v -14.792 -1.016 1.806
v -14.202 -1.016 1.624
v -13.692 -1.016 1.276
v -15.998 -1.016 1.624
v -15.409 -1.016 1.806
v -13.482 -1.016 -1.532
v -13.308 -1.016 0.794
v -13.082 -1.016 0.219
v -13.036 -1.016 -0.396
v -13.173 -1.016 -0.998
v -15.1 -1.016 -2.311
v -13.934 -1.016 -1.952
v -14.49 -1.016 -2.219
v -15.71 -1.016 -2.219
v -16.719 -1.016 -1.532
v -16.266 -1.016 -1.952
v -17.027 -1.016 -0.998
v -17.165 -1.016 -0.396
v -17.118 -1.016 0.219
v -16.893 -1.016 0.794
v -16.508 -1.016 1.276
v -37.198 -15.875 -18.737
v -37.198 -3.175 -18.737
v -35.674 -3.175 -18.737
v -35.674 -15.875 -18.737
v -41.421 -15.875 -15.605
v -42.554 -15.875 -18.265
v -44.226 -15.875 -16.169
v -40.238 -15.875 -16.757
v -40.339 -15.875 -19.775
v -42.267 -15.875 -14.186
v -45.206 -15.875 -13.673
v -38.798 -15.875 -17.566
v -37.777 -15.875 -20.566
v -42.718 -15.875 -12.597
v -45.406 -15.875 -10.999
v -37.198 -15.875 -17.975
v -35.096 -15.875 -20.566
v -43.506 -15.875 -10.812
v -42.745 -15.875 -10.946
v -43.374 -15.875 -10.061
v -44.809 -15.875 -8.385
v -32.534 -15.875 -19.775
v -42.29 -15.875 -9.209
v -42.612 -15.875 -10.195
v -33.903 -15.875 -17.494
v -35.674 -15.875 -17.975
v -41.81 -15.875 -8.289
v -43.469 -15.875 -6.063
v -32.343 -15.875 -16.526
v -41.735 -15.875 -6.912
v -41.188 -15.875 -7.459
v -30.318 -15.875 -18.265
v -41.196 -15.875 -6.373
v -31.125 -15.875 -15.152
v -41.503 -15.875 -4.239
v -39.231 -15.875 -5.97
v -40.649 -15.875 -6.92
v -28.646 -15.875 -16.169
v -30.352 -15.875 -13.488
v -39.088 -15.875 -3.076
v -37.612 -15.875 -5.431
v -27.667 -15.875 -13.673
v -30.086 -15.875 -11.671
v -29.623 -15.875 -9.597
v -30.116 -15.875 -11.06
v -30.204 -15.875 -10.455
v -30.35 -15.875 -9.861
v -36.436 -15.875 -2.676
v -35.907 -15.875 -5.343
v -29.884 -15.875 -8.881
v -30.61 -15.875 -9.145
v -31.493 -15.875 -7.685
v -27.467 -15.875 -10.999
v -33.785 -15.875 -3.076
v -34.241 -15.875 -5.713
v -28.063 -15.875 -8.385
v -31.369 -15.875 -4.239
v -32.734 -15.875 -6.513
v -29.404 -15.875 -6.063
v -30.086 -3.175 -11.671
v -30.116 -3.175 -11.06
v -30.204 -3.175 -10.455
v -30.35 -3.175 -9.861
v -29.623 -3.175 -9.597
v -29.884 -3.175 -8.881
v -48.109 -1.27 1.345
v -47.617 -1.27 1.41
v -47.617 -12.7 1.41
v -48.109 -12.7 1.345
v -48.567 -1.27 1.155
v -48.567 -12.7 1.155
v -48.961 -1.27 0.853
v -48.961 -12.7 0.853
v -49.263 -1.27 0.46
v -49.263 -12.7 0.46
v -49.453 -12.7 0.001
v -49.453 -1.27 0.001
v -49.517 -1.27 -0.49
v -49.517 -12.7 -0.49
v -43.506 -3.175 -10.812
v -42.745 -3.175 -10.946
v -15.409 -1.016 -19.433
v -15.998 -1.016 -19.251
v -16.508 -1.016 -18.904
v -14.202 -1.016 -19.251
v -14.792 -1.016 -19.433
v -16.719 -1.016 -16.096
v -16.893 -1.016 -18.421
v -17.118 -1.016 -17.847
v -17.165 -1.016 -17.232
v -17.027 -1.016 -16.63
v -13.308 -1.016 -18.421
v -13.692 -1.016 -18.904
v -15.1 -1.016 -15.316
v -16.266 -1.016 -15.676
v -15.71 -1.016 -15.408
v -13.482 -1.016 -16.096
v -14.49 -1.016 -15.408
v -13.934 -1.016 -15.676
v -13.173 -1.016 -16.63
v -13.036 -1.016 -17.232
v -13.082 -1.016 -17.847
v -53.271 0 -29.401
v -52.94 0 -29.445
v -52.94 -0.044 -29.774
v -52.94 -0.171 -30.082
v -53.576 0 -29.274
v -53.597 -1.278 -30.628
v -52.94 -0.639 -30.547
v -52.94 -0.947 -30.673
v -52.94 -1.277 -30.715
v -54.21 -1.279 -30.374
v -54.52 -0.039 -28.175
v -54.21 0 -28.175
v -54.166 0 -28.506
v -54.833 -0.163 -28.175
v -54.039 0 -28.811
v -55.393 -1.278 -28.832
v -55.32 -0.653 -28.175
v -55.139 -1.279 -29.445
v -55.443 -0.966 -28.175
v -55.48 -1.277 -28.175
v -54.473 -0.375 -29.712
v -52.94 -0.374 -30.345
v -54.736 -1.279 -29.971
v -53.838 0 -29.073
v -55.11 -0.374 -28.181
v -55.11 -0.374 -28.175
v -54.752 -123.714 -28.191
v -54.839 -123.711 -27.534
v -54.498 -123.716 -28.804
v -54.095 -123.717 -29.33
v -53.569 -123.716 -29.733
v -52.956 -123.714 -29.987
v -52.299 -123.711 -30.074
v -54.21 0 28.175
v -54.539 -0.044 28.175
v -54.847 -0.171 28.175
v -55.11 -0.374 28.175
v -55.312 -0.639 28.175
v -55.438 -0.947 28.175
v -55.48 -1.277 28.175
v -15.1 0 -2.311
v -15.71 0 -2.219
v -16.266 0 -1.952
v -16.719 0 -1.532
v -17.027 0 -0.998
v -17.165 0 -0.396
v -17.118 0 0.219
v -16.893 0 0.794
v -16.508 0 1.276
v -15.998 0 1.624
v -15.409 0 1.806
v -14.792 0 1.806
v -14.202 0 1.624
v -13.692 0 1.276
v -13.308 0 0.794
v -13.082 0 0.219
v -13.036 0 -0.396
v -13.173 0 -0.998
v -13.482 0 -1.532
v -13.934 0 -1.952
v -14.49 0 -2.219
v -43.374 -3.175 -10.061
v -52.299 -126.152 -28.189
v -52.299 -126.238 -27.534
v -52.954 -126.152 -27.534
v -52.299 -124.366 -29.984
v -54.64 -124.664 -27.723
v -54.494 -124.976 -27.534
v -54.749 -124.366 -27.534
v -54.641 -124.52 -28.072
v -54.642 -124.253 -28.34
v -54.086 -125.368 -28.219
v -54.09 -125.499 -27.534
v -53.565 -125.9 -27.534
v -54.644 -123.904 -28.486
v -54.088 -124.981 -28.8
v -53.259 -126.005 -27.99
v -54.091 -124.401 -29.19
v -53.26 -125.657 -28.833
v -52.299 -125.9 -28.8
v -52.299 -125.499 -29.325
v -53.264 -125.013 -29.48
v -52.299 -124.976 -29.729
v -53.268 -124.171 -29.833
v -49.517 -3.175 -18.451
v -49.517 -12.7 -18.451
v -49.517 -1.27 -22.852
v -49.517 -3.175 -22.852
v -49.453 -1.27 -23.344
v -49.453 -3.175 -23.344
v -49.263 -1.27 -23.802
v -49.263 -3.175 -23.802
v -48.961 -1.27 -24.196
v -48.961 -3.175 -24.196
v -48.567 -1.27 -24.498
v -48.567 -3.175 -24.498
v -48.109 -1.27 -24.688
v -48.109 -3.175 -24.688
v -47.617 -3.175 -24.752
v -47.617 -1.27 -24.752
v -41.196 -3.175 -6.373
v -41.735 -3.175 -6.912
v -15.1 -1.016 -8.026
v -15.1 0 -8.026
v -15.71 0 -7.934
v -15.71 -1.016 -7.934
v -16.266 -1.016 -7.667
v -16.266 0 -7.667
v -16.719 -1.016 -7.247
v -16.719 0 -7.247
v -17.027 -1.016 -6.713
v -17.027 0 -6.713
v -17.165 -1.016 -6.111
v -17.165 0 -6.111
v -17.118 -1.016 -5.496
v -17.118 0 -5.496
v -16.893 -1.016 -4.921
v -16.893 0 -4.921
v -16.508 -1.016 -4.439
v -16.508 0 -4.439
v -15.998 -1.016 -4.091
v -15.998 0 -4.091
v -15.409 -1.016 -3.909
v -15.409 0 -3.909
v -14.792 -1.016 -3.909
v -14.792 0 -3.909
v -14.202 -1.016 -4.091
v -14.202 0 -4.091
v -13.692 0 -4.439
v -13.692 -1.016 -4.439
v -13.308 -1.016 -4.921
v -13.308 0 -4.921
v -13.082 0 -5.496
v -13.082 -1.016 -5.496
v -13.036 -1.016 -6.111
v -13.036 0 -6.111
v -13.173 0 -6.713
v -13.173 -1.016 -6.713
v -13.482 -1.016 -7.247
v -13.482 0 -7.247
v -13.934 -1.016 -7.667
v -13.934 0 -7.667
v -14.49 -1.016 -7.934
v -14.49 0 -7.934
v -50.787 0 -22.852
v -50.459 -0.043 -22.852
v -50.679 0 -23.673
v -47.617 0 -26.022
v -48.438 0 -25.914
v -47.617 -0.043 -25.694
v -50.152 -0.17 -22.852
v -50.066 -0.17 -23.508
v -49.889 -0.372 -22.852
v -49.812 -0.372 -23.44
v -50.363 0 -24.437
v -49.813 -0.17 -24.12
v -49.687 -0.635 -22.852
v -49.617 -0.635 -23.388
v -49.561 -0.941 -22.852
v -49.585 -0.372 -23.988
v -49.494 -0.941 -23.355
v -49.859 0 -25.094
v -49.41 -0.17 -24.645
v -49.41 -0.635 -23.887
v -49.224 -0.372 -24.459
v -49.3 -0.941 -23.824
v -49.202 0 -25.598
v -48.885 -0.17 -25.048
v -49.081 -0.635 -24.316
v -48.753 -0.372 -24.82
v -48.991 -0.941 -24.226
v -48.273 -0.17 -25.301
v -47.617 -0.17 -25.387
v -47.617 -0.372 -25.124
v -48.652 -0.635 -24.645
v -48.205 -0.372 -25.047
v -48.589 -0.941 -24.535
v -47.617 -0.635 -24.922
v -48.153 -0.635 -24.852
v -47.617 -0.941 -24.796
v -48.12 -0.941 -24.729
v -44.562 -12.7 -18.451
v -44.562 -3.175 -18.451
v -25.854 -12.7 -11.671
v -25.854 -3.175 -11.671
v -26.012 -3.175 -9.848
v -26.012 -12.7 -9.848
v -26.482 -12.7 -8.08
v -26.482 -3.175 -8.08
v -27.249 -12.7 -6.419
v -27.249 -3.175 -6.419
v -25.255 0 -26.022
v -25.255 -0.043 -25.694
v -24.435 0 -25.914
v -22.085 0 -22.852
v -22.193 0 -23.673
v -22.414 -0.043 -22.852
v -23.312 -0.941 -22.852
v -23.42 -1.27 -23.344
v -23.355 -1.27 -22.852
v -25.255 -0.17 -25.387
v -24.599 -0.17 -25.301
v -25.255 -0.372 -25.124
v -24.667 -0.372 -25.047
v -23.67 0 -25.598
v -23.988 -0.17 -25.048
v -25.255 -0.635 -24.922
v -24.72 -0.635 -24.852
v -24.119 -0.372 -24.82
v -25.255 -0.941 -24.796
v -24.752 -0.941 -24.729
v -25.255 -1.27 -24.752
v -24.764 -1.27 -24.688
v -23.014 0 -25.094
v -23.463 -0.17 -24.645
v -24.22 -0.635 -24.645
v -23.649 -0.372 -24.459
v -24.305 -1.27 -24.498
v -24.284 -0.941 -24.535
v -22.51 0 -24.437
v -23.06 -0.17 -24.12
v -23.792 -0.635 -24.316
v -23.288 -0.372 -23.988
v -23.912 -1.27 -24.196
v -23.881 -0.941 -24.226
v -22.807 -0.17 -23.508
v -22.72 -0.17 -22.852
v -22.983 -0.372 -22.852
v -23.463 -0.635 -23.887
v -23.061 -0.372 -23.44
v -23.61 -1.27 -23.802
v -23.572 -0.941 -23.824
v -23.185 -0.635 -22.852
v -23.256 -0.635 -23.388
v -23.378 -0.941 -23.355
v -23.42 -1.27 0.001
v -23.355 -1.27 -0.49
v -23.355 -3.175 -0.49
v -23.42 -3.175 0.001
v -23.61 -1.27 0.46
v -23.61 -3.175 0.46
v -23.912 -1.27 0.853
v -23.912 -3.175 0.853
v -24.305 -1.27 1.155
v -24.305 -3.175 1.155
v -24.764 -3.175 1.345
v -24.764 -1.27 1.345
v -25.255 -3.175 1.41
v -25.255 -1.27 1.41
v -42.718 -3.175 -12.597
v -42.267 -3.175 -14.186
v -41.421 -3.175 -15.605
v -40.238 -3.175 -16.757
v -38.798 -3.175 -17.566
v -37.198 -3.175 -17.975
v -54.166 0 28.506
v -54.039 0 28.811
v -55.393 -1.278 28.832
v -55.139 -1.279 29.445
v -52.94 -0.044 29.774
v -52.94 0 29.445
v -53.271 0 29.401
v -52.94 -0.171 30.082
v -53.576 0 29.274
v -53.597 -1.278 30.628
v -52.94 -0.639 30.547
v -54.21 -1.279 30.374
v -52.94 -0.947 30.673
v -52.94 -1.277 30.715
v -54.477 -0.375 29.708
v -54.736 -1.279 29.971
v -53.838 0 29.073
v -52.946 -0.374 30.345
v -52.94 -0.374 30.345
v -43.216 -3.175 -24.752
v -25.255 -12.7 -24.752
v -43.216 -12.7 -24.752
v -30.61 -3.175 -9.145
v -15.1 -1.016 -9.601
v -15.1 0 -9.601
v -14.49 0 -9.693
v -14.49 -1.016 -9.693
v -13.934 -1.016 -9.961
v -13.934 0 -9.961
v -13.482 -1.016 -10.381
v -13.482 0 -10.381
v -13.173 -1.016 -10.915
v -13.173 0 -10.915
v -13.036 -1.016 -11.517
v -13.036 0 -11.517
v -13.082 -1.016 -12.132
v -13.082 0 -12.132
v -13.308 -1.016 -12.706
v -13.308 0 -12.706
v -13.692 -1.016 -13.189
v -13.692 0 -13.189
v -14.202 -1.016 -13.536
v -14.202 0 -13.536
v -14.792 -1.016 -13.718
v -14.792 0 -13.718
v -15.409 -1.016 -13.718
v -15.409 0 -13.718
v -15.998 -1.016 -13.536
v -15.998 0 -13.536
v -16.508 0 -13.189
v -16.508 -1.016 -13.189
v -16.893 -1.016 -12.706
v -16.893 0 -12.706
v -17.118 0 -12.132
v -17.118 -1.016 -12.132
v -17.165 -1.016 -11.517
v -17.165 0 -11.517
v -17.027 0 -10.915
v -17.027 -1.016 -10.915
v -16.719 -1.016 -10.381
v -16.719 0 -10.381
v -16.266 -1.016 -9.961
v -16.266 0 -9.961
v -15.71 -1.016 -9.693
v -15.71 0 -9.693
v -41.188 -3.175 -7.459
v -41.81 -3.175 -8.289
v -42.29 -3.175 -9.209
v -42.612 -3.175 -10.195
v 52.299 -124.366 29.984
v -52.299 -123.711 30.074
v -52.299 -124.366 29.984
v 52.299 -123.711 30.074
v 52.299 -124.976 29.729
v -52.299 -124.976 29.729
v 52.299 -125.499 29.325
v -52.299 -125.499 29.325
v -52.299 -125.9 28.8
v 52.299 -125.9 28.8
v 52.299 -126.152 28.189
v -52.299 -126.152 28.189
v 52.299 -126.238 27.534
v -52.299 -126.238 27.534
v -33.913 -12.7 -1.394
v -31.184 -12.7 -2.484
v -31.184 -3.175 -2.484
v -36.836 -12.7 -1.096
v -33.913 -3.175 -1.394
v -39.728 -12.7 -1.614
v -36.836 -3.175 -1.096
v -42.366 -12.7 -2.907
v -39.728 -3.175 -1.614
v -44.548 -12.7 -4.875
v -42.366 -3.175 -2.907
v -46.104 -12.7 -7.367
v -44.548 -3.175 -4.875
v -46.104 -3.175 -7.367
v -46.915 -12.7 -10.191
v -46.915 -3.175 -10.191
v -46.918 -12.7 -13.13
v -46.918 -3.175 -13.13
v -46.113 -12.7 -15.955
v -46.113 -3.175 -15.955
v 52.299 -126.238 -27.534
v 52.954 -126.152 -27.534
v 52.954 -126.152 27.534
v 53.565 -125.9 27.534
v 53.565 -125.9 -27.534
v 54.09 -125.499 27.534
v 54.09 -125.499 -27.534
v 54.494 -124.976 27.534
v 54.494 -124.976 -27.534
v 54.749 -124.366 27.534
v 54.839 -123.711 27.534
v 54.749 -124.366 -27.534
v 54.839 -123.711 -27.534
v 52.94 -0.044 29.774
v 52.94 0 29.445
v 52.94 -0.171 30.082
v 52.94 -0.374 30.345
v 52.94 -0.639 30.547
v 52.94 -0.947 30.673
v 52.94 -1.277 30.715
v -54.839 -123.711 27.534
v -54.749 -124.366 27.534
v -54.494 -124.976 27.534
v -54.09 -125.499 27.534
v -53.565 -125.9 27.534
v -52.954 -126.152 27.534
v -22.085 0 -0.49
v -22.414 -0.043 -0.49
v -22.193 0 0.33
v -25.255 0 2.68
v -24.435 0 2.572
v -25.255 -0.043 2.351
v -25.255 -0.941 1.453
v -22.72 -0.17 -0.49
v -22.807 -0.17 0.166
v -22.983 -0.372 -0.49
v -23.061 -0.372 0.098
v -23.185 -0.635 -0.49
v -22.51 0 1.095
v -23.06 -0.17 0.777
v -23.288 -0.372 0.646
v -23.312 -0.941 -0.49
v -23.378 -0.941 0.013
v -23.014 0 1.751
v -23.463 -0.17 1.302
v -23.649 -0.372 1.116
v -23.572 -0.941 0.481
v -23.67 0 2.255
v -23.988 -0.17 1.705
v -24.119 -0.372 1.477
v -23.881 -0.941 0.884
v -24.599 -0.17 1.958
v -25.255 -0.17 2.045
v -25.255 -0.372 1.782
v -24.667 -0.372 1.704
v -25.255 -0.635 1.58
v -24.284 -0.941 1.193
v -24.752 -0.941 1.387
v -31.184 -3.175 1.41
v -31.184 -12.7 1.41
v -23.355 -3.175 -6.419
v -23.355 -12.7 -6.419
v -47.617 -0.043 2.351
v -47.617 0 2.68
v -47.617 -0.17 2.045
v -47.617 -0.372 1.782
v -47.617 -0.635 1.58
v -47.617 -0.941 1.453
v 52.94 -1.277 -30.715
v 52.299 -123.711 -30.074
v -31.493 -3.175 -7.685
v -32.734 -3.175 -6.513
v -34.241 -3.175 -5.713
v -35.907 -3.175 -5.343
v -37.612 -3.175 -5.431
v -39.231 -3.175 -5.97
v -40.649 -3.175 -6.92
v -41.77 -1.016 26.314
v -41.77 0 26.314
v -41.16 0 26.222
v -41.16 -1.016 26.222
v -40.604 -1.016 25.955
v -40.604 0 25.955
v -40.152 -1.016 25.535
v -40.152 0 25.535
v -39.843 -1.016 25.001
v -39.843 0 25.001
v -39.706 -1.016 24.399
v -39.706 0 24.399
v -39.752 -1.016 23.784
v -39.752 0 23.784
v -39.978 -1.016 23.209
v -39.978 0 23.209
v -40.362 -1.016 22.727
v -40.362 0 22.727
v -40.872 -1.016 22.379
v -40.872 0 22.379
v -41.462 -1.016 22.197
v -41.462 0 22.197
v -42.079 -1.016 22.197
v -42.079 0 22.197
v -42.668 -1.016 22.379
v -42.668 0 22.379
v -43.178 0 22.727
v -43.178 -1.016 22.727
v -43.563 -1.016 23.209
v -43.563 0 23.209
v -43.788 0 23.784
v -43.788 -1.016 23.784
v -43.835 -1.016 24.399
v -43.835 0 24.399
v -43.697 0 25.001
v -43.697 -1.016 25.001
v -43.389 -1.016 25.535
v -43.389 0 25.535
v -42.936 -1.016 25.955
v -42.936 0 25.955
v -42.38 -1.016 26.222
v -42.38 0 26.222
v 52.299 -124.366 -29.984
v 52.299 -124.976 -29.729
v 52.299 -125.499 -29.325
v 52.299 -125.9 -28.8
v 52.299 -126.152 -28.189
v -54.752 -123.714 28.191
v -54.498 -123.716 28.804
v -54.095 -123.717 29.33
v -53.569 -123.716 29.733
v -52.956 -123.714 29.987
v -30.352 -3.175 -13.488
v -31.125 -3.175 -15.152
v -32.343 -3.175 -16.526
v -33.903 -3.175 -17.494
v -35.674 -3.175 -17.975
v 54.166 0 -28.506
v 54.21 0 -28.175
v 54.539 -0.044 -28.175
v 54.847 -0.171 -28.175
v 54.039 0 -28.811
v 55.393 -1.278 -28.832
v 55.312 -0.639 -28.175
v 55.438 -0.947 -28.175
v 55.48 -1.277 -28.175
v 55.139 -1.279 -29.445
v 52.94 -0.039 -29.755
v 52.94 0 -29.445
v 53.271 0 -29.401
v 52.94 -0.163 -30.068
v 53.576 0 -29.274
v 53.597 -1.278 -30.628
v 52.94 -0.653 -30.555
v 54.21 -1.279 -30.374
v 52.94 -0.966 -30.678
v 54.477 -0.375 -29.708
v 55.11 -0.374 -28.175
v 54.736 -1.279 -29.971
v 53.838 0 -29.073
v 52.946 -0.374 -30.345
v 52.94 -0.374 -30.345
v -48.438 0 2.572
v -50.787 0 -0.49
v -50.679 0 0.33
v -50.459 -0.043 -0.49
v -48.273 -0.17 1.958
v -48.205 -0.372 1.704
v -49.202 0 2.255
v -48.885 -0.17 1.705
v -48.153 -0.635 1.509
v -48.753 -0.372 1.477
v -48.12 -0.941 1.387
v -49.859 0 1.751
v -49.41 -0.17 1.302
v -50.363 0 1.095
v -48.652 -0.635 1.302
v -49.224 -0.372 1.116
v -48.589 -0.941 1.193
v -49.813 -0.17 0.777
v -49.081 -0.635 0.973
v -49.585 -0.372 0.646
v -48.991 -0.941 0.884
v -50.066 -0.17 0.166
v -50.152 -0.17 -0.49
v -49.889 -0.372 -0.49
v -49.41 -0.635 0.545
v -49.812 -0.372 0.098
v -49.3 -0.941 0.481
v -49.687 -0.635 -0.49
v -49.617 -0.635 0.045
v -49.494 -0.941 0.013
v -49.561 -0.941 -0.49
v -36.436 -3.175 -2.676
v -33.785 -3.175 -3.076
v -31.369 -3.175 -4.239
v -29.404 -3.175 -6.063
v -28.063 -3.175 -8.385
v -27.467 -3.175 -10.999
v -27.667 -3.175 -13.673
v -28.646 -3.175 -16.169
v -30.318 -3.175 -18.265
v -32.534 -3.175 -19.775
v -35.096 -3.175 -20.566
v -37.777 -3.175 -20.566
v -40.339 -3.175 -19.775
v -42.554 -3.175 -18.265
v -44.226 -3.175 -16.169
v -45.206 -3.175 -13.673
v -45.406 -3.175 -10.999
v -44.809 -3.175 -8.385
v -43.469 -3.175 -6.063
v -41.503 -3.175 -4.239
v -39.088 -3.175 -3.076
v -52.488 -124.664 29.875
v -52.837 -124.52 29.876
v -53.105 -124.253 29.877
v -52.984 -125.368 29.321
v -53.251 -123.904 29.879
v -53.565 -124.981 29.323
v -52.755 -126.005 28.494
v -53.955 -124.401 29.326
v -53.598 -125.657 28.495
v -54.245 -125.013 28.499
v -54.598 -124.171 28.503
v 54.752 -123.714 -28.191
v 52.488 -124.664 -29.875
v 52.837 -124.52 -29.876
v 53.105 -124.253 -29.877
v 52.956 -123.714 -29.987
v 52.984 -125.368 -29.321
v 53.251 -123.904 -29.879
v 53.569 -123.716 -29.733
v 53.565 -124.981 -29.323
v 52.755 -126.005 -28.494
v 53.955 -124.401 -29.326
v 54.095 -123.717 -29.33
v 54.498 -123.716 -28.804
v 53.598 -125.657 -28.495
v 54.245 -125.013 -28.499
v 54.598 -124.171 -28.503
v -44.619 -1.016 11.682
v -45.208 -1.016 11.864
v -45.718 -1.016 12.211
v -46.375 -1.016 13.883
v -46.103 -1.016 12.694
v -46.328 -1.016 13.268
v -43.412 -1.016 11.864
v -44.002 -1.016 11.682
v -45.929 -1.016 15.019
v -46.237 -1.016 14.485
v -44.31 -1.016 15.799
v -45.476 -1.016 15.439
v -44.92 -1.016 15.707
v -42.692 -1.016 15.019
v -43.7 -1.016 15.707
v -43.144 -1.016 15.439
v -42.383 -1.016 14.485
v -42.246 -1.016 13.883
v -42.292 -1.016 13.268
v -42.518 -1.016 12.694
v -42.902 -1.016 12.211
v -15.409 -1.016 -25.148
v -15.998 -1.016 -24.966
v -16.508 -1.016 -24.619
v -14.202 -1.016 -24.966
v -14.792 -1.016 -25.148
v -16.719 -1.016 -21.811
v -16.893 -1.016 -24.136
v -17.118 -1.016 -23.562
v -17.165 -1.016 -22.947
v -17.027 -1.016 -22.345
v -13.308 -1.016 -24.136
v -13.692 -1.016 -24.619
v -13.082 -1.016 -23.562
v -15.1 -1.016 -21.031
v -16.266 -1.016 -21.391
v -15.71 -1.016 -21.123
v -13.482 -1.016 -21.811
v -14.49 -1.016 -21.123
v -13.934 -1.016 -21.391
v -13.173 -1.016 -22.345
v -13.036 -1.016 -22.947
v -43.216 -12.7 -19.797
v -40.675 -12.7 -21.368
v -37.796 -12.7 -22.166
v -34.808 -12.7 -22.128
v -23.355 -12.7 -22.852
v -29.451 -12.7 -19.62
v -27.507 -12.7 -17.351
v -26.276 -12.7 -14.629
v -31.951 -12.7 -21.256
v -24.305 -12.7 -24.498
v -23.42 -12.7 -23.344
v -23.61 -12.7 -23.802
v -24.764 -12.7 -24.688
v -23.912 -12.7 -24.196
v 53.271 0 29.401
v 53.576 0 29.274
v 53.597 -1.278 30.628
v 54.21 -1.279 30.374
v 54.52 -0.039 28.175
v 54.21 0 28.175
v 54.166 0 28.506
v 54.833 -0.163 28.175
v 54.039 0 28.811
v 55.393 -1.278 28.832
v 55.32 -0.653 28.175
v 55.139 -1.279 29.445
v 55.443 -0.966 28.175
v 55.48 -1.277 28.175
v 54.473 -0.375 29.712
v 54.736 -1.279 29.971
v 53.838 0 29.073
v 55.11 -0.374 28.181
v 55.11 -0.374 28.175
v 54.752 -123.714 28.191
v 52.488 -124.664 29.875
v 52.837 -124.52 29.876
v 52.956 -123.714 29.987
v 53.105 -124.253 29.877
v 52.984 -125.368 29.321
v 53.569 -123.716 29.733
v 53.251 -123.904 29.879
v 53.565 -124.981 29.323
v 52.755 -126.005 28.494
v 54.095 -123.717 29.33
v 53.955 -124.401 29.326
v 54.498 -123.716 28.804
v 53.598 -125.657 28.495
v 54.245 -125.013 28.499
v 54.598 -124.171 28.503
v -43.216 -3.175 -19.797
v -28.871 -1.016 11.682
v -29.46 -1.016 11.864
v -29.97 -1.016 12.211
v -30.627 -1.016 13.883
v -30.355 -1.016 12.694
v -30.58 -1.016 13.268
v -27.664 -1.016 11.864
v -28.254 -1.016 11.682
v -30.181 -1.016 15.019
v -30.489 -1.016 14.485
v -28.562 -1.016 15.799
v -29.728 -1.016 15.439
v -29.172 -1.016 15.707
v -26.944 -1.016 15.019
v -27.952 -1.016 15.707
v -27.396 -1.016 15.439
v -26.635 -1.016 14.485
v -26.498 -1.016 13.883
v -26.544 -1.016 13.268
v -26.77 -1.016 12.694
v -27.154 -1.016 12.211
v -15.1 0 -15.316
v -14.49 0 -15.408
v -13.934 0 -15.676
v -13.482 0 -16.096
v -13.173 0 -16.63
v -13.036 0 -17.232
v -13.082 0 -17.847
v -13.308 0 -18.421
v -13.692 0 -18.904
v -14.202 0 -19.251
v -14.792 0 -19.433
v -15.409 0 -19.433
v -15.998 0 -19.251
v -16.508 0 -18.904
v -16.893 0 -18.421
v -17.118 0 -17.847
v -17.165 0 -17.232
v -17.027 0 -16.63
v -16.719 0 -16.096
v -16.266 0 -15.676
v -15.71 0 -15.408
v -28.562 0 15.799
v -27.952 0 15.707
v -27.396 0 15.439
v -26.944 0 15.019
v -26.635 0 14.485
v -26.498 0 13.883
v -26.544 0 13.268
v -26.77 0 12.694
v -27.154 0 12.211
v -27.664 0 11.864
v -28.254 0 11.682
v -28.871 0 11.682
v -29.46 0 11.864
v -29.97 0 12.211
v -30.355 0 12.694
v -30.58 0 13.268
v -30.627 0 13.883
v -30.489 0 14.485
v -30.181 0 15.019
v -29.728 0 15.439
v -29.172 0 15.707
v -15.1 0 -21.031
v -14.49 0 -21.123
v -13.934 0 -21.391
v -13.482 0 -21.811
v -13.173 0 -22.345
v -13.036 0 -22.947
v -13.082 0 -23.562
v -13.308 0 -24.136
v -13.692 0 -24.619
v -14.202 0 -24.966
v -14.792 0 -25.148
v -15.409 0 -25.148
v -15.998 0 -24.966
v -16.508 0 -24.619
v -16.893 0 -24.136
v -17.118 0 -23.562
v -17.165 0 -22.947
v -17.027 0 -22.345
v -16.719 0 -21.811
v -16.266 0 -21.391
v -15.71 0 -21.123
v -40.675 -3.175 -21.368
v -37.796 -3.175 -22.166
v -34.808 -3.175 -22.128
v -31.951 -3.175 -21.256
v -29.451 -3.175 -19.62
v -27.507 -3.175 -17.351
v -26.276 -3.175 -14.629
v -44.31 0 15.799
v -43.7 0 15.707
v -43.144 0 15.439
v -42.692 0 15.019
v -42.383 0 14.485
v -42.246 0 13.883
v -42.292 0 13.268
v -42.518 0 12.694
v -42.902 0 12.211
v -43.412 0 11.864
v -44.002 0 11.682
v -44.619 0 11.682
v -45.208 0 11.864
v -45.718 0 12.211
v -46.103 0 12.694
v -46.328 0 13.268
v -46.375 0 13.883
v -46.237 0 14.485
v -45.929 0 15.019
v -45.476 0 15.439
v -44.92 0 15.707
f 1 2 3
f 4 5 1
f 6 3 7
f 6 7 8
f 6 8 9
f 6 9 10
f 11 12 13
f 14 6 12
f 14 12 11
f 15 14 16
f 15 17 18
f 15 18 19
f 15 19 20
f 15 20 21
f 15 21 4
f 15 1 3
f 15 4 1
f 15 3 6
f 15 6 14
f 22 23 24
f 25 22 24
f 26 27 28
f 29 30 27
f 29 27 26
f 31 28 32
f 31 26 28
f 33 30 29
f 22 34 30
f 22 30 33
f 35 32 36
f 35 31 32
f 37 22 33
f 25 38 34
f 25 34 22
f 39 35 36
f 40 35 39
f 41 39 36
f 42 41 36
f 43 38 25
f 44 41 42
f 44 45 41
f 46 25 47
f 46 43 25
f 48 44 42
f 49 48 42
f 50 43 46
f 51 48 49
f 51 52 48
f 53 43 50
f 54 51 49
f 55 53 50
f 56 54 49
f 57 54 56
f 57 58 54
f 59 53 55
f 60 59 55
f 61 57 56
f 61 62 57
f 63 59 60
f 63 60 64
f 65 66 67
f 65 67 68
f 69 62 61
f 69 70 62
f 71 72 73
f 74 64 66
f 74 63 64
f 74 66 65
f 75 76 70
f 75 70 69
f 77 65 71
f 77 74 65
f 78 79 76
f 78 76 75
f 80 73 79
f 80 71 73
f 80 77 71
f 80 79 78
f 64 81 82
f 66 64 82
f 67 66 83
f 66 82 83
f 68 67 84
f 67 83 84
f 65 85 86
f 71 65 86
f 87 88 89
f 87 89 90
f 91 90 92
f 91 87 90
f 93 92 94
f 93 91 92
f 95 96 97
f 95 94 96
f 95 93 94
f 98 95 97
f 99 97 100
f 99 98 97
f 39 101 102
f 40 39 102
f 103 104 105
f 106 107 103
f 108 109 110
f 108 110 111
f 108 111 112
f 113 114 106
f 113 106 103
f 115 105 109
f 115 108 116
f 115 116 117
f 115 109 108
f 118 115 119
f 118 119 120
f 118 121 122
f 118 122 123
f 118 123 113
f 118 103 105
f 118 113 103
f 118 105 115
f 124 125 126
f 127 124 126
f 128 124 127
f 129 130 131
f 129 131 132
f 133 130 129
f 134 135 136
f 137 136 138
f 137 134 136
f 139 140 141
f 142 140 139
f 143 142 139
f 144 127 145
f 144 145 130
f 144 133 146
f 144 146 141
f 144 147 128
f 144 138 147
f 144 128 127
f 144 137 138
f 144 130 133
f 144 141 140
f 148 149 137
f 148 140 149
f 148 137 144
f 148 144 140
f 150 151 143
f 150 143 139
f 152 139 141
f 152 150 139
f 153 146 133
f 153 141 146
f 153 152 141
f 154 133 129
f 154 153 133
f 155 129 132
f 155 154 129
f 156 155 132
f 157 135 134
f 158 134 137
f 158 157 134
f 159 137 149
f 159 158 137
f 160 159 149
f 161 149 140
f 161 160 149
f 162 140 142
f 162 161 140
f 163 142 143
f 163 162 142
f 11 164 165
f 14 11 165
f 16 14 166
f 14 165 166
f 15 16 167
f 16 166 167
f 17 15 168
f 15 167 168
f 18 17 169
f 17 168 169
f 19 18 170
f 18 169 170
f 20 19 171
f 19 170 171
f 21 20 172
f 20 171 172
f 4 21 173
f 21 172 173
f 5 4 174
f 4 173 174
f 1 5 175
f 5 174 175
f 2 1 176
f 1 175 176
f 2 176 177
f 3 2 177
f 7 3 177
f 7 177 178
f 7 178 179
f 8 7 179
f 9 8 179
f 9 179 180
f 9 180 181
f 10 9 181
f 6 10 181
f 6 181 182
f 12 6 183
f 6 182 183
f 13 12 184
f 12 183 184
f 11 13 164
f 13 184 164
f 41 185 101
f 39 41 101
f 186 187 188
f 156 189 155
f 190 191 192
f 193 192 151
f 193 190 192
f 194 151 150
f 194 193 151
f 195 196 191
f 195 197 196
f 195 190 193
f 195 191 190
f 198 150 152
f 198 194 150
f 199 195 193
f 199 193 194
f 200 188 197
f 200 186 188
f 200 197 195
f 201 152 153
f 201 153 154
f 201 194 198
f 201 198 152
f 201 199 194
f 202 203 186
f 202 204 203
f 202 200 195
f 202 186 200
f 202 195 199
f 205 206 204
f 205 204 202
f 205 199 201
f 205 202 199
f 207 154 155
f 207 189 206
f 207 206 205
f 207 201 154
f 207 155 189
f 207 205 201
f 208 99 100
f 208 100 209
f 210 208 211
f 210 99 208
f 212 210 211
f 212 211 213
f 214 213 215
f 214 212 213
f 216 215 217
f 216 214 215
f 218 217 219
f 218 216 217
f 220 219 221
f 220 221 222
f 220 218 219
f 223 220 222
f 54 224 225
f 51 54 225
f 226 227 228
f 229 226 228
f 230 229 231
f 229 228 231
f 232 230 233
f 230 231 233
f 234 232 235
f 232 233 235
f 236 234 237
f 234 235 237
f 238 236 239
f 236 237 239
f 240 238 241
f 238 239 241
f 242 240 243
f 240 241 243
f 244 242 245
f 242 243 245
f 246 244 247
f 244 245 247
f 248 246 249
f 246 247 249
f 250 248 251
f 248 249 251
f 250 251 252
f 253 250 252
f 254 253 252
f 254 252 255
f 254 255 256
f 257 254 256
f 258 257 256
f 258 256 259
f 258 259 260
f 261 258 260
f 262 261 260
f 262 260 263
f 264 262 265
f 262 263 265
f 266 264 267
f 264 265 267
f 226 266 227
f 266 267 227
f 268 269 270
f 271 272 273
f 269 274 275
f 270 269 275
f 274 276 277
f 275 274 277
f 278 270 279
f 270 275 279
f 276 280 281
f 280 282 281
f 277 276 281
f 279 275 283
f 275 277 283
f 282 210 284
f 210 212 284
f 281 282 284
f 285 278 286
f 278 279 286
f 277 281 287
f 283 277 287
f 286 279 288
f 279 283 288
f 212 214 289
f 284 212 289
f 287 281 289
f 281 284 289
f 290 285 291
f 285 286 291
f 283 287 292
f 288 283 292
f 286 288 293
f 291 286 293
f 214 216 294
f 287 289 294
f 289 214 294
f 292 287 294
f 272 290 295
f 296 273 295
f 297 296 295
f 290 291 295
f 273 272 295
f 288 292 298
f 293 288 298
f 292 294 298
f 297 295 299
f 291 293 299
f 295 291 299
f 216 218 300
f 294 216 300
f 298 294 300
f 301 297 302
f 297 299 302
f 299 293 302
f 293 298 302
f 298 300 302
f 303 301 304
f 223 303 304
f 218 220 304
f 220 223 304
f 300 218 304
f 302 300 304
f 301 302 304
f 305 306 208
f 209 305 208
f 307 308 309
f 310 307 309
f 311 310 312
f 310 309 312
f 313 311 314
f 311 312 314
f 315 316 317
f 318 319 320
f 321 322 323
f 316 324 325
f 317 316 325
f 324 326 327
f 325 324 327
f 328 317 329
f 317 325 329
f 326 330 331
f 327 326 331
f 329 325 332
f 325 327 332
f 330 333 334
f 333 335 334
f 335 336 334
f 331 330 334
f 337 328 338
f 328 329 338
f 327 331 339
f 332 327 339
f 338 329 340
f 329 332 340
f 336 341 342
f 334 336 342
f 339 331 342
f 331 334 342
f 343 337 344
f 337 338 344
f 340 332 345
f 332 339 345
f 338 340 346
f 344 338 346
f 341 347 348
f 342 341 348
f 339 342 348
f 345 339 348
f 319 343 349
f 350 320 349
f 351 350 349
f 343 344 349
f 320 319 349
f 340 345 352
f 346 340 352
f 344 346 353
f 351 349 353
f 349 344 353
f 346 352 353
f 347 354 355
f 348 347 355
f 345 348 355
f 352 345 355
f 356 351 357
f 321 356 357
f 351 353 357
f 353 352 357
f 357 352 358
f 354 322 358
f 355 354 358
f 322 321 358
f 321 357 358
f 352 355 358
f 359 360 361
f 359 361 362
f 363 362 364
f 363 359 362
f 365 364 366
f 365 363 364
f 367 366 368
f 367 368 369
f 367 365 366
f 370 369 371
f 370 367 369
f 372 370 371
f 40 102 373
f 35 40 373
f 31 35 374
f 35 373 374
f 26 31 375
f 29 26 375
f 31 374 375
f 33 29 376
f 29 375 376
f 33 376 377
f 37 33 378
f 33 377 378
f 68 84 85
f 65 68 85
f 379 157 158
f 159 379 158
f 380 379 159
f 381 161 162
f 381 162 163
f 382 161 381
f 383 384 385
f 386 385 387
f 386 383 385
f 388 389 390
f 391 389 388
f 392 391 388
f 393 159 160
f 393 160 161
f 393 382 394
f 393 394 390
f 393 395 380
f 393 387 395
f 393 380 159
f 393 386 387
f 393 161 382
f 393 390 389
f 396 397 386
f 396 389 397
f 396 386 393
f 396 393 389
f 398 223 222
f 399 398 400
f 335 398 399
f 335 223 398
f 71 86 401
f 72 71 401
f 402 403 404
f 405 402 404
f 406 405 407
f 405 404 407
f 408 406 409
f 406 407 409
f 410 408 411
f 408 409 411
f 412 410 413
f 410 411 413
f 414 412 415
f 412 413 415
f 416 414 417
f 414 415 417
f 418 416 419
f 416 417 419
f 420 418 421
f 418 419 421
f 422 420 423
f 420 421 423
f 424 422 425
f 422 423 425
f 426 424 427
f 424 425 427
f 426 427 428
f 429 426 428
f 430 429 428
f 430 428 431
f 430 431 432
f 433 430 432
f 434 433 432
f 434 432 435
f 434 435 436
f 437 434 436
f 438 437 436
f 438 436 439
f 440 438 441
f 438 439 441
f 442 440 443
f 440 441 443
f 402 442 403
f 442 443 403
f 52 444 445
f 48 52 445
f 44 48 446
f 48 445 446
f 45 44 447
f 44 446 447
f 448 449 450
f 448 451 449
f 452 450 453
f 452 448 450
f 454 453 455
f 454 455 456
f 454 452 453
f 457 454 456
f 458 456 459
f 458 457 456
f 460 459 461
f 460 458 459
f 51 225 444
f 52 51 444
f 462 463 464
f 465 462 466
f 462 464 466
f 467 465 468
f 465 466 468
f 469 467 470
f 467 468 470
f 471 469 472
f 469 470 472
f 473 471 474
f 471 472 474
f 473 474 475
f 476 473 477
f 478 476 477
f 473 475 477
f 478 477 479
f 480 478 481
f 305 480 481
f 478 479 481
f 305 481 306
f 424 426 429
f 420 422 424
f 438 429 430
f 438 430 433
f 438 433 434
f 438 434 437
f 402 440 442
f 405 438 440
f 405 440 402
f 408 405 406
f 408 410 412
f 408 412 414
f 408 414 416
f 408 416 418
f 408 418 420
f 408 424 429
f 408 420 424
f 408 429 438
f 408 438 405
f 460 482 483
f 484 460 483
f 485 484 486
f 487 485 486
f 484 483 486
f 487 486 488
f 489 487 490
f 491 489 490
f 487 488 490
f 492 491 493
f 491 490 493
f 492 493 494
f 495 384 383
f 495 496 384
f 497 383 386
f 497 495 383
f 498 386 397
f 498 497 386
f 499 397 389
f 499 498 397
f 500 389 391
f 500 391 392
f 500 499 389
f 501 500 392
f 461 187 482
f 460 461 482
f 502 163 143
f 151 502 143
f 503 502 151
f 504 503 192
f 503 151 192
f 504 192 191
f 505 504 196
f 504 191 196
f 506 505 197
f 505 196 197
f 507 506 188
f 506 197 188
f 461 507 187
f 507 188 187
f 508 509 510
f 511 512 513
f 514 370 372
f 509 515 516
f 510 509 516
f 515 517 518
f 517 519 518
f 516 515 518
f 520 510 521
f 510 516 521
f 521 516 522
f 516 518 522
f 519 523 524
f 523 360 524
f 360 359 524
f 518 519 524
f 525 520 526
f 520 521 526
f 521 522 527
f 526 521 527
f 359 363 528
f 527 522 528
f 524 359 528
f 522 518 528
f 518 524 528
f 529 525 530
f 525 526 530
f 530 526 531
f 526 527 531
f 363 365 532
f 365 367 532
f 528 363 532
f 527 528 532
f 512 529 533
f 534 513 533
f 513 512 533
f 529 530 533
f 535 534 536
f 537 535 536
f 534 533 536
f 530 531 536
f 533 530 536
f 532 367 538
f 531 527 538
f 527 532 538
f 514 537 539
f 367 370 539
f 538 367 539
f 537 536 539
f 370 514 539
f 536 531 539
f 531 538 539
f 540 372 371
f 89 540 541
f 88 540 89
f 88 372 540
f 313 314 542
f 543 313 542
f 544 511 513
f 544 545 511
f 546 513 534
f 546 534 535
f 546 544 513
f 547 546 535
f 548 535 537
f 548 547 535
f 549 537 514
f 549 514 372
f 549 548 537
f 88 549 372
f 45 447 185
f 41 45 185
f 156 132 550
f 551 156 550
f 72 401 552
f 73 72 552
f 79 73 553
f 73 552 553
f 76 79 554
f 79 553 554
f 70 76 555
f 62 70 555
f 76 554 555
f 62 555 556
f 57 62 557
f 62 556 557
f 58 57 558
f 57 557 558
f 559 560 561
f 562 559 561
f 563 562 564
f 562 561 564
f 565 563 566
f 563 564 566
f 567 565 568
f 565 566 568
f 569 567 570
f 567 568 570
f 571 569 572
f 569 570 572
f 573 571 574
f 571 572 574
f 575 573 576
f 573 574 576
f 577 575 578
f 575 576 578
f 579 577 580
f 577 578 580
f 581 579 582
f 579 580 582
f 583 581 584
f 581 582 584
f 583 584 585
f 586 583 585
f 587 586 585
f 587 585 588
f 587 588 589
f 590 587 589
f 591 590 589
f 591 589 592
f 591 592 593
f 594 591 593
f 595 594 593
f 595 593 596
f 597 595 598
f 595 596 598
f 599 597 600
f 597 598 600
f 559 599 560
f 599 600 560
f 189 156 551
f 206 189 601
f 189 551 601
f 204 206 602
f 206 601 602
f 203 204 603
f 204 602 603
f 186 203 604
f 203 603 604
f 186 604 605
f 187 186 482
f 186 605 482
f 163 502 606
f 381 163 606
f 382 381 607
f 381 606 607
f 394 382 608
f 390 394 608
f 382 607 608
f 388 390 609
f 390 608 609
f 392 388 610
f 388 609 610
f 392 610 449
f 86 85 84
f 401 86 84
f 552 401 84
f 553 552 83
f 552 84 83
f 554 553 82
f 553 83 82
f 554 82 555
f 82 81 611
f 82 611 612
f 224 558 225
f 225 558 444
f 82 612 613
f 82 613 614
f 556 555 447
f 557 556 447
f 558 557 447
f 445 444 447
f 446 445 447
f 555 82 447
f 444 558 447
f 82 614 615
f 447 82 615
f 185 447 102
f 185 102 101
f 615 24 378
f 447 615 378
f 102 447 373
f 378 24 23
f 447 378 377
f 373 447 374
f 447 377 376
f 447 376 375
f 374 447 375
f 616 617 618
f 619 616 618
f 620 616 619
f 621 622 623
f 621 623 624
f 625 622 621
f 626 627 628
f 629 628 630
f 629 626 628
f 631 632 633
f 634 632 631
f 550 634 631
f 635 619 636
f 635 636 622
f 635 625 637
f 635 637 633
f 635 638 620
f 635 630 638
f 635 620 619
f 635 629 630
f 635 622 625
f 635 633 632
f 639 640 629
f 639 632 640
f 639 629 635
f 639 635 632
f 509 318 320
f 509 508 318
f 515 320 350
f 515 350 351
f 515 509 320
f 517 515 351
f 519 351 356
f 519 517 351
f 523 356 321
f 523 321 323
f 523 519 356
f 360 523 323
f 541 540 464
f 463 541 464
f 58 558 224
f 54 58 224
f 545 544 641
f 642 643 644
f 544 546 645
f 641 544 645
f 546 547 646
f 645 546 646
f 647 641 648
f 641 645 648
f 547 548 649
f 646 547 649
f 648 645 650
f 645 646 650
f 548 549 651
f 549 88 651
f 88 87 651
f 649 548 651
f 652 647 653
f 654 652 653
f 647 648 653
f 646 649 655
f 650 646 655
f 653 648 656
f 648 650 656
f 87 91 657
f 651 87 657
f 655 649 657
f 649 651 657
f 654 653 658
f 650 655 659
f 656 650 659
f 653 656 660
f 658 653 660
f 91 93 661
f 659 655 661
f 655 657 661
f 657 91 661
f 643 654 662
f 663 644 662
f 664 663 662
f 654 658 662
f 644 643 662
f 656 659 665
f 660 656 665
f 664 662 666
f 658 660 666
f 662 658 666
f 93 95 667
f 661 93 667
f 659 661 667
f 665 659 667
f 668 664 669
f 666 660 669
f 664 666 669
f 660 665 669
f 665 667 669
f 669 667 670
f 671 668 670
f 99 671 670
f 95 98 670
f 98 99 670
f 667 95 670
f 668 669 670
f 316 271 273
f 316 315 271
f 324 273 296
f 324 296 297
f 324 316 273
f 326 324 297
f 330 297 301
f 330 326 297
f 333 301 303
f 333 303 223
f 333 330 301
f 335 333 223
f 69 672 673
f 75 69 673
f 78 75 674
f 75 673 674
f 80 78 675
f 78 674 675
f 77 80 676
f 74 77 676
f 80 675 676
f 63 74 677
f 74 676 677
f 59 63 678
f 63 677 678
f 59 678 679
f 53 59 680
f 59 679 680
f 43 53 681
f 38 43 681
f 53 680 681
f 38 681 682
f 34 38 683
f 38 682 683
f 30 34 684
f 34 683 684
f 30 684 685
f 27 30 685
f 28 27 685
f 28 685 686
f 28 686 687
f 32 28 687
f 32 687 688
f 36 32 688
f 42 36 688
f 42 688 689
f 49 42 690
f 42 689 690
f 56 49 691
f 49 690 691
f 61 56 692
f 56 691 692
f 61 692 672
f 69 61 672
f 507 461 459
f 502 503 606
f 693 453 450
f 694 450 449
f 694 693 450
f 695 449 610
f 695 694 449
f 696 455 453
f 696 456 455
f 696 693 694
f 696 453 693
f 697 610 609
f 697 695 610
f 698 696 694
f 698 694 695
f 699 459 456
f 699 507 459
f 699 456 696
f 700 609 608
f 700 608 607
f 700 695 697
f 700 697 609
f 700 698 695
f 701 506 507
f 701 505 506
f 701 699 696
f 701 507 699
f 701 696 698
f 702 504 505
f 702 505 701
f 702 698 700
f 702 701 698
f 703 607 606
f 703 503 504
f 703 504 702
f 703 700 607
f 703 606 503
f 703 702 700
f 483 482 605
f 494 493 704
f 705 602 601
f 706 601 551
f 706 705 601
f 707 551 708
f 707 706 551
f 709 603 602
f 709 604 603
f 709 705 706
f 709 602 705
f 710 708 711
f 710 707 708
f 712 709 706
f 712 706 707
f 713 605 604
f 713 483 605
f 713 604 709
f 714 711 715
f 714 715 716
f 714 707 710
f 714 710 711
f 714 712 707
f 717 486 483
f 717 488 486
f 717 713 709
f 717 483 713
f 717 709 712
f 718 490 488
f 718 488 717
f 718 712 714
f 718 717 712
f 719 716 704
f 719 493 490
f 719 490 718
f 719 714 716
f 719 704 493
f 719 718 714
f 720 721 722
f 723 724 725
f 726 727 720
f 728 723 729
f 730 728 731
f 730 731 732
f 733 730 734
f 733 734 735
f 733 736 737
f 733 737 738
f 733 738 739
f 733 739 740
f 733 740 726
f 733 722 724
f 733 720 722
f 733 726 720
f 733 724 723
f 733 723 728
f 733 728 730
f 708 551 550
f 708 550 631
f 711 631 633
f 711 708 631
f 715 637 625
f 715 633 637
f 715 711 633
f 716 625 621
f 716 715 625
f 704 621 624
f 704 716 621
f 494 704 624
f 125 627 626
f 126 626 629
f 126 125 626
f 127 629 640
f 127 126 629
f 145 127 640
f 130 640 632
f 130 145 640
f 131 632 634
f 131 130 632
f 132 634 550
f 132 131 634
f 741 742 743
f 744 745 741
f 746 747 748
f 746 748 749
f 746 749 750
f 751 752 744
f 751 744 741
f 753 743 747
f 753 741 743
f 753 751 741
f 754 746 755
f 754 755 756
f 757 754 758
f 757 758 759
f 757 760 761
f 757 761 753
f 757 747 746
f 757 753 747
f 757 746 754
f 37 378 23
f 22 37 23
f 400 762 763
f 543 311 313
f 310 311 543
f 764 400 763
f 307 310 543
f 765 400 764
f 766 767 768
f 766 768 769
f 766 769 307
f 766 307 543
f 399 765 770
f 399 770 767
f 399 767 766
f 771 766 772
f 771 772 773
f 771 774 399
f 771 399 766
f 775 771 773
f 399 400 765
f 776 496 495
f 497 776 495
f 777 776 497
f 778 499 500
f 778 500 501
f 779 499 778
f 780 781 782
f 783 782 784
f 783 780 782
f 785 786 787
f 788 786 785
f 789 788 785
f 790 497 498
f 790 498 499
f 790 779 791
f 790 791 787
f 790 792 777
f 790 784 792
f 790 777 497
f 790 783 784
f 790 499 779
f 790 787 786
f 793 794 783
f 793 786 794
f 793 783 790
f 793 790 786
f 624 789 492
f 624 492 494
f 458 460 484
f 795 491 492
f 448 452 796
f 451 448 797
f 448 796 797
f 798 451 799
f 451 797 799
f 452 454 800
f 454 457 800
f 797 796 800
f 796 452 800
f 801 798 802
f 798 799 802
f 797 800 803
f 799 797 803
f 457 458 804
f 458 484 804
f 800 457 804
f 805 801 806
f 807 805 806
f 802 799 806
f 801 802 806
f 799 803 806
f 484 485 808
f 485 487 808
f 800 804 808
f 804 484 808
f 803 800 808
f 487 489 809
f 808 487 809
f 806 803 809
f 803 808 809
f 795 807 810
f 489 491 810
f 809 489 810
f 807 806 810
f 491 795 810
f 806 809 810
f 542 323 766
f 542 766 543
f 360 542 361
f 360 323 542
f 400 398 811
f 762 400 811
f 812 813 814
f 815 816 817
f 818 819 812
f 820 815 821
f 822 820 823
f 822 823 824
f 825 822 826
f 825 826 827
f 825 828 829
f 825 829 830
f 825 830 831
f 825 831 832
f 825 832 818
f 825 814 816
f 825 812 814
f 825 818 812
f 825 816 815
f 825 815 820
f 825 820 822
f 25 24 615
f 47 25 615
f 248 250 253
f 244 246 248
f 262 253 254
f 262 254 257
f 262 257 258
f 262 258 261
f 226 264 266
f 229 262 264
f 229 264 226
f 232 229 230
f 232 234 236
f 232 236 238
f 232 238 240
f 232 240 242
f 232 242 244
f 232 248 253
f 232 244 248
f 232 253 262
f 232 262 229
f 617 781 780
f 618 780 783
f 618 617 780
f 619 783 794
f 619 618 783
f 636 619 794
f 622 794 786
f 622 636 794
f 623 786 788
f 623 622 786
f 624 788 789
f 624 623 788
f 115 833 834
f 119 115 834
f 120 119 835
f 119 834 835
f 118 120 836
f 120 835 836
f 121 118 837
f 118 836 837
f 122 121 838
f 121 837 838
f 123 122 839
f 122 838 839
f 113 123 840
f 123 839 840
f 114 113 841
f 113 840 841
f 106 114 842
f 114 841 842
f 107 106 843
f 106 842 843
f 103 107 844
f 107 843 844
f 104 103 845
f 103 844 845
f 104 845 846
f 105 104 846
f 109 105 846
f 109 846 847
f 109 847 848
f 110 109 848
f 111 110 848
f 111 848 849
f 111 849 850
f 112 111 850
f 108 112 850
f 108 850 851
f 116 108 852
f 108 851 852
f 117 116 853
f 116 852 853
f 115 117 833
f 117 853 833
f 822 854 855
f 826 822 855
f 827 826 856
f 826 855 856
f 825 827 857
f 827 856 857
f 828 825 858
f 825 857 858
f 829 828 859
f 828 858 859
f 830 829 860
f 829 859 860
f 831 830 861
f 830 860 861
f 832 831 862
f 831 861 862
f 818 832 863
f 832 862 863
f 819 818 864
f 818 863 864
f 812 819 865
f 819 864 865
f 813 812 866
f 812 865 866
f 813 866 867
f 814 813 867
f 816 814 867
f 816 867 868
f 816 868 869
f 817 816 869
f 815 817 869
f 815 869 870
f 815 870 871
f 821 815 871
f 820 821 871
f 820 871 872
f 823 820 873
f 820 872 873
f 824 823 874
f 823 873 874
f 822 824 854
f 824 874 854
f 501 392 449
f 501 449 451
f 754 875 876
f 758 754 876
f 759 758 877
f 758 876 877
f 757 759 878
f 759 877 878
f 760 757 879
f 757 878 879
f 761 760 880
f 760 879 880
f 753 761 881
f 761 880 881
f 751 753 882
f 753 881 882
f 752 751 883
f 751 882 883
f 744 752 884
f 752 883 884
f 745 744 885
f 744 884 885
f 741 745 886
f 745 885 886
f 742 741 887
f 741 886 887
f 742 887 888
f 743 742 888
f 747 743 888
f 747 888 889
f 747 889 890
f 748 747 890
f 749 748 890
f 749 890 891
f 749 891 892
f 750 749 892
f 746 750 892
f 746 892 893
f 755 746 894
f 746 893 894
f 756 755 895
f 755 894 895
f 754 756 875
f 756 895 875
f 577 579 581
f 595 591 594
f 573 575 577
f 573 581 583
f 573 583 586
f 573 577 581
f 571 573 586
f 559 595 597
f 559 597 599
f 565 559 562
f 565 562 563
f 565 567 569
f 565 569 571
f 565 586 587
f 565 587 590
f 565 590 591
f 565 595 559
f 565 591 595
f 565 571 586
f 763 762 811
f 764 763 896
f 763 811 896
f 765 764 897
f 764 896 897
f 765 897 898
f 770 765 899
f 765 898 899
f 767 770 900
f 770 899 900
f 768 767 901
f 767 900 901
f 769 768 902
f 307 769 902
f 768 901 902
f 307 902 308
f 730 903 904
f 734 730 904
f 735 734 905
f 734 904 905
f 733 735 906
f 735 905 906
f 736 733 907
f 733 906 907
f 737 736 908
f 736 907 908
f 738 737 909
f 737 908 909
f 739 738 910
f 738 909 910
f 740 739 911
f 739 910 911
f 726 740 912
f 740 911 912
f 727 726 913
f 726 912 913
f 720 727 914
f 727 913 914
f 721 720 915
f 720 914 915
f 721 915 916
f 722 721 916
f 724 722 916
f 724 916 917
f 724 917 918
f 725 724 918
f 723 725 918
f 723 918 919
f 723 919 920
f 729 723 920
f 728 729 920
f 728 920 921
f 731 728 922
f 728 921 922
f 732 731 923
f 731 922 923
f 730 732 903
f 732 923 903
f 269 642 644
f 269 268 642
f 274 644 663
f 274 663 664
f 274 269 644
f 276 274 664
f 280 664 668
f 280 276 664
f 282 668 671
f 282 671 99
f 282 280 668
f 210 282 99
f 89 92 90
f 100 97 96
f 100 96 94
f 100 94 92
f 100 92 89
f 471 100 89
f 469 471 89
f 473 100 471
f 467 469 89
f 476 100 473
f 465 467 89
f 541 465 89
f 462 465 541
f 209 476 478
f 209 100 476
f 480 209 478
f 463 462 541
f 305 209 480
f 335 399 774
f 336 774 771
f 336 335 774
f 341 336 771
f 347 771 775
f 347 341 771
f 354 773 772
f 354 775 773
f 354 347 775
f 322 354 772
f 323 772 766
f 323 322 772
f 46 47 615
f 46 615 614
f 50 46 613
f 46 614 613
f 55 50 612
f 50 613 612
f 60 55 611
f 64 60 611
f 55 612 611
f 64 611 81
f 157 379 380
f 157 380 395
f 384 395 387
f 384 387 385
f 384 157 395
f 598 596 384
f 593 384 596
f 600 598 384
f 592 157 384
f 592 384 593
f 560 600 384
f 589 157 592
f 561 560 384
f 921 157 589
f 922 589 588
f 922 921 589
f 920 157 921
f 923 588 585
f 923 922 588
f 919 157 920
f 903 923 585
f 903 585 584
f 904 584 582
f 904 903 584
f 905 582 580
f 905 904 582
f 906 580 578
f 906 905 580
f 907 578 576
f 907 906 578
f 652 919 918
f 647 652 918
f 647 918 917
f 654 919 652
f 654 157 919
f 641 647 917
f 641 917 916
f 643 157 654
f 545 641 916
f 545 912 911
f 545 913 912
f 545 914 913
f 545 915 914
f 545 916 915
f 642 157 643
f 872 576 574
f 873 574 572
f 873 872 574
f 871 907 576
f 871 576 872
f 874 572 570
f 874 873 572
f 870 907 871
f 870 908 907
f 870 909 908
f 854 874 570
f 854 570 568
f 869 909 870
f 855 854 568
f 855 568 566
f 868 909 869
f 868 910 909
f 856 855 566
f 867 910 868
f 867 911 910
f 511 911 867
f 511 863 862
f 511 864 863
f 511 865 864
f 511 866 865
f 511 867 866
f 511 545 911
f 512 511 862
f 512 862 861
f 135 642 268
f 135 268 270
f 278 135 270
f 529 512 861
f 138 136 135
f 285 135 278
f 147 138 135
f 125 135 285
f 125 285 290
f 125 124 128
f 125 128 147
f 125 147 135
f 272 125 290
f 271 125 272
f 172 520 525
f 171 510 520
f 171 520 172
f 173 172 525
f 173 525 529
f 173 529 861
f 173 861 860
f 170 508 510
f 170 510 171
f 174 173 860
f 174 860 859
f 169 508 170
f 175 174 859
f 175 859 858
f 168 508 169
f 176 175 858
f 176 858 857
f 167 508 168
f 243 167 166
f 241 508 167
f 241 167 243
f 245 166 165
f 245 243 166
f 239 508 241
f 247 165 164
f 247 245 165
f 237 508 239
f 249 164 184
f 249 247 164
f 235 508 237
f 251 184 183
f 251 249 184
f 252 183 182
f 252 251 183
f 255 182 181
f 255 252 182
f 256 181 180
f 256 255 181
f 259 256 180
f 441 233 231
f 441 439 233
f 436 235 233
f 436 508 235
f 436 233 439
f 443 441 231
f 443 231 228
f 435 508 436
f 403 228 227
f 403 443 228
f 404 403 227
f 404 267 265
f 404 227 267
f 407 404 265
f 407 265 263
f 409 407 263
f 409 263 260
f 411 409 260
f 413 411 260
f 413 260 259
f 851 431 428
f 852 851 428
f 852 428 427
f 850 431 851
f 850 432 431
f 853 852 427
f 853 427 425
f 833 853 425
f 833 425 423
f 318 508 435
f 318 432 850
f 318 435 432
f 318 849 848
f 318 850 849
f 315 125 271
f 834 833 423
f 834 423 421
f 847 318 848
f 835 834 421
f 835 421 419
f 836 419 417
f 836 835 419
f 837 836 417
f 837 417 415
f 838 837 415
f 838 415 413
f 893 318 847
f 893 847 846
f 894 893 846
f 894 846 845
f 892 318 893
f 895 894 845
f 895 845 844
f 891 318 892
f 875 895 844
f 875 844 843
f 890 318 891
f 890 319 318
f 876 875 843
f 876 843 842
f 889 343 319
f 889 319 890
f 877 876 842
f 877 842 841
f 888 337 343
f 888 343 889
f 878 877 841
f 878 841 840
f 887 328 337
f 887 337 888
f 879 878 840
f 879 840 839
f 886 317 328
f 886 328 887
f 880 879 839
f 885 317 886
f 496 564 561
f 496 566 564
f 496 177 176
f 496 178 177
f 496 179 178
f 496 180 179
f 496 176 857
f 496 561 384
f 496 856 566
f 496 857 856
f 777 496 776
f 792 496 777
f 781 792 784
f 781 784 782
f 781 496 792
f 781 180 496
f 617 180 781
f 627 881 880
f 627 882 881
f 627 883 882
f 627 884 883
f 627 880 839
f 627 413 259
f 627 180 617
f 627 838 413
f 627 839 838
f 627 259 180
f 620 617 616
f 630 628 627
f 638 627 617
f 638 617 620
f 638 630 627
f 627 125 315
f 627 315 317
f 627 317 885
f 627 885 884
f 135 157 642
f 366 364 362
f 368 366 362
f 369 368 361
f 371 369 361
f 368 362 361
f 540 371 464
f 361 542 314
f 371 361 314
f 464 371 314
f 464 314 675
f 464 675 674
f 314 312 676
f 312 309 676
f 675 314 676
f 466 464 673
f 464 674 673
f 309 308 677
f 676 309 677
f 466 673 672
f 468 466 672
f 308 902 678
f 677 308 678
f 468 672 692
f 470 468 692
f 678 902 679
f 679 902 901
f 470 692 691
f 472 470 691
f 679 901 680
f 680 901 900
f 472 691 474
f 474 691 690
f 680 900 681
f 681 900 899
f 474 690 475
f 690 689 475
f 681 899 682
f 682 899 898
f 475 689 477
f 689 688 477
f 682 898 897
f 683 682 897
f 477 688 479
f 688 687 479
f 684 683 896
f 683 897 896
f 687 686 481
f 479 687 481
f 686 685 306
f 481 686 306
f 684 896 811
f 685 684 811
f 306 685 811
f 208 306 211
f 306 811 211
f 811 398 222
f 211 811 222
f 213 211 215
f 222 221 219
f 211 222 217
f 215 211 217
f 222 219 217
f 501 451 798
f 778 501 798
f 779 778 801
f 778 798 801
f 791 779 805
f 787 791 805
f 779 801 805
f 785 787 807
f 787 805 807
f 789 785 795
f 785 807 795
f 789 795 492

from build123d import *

# Parameters (mm, degrees)
SKETCH1_W          = 110.9726
SKETCH1_H          = 61.4426
EXTRUDE1_DEPTH     = 126.238
EXTRUDE1_DRAFT     = -0.3
CUT_EXTRUDE1_DEPTH = 3.175
CUT_EXTRUDE2_DEPTH = 12.7
SKETCH10_R         = 8.994906853
CUT_EXTRUDE3_DEPTH = 12.7
FILLET1_R          = 2.54
FILLET2_R          = 1.27
SKETCH2_R          = 2.0701
EXTRUDE2_DEPTH     = 1.016


with BuildPart() as part:
    # Sketch1 → Extrude1 (with draft: the straight prism first)
    with BuildSketch(Plane(origin=(0, 0, 0), x_dir=(1, 0, 0), z_dir=(0, 1, 0))):
        Rectangle(SKETCH1_W, SKETCH1_H)
    extrude(amount=-EXTRUDE1_DEPTH)
    # Extrude1: the draft: its side faces are tilted about the plane it starts from
    extrude1_sides = [part.faces().sort_by_distance(p)[0] for p in [
        (-55.4863, -63.119, 0),
        (0, -63.119, 30.7213),
        (55.4863, -63.119, 0),
        (0, -63.119, -30.7213),
    ]]
    draft(extrude1_sides, Plane(origin=(0, 0, 0), x_dir=(1, 0, 0), z_dir=(0, 1, 0)), EXTRUDE1_DRAFT)

    # Sketch9 → Cut-Extrude1 (cut)
    with BuildSketch(Plane(origin=(0, 0, 0), x_dir=(1, 0, 0), z_dir=(0, 1, 0))):
        with BuildLine():
            Line((-25.255419616, -1.4097), (-47.617180384, -1.4097))
            ThreePointArc((-47.617180384, -1.4097), (-48.960767849, -0.853167849), (-49.5173, 0.490419616))
            Line((-49.5173, 0.490419616), (-49.5173, 22.852180384))
            ThreePointArc((-49.5173, 22.852180384), (-48.960767849, 24.195767849), (-47.617180384, 24.7523))
            Line((-47.617180384, 24.7523), (-25.255419616, 24.7523))
            ThreePointArc((-25.255419616, 24.7523), (-23.911832151, 24.195767849), (-23.3553, 22.852180384))
            Line((-23.3553, 22.852180384), (-23.3553, 0.490419616))
            ThreePointArc((-23.3553, 0.490419616), (-23.911832151, -0.853167849), (-25.255419616, -1.4097))
        make_face()
    extrude(amount=-CUT_EXTRUDE1_DEPTH, mode=Mode.SUBTRACT)

    # Sketch9<3> → Cut-Extrude2 (cut)
    with BuildSketch(Plane(origin=(0, 0, 0), x_dir=(1, 0, 0), z_dir=(0, 1, 0))):
        with BuildLine():
            Line((-47.617180384, -1.4097), (-31.184011382, -1.4097))
            Line((-31.184011382, -1.4097), (-31.184011382, 2.484309248))
            ThreePointArc((-31.184011382, 2.484309248), (-44.547832783, 4.874950192), (-44.56182891, 18.450910219))
            Line((-44.56182891, 18.450910219), (-49.5173, 18.450910219))
            Line((-49.5173, 18.450910219), (-49.5173, 0.490419616))
            ThreePointArc((-49.5173, 0.490419616), (-48.960767849, -0.853167849), (-47.617180384, -1.4097))
        make_face()
        with BuildLine():
            Line((-27.249309248, 6.419011382), (-23.3553, 6.419011382))
            Line((-23.3553, 6.419011382), (-23.3553, 22.852180384))
            ThreePointArc((-23.3553, 22.852180384), (-23.911832151, 24.195767849), (-25.255419616, 24.7523))
            Line((-25.255419616, 24.7523), (-43.215910219, 24.7523))
            Line((-43.215910219, 24.7523), (-43.215910219, 19.79682891))
            ThreePointArc((-43.215910219, 19.79682891), (-29.639950192, 19.782832783), (-27.249309248, 6.419011382))
        make_face()
    extrude(amount=-CUT_EXTRUDE2_DEPTH, mode=Mode.SUBTRACT)

    # Sketch10 → Cut-Extrude3 (cut)
    with BuildSketch(Plane(origin=(0, -3.175, 0), x_dir=(1, 0, 0), z_dir=(0, 1, 0))):
        with Locations((-36.4363, 11.6713)):
            Circle(SKETCH10_R)
        with BuildLine():
            Line((-35.6743, 18.737414212), (-35.6743, 17.975414212))
            ThreePointArc((-35.6743, 17.975414212), (-31.684395119, 15.883413484), (-30.0863, 11.6713))
            ThreePointArc((-30.0863, 11.6713), (-30.152493141, 10.756821264), (-30.349692554, 9.861407793))
            Line((-30.349692554, 9.861407793), (-29.622896406, 9.596875629))
            Line((-29.622896406, 9.596875629), (-29.883515756, 8.880829852))
            Line((-29.883515756, 8.880829852), (-30.610311903, 9.145362016))
            ThreePointArc((-30.610311903, 9.145362016), (-35.061908451, 5.471820355), (-40.648930859, 6.919853773))
            Line((-40.648930859, 6.919853773), (-41.195835744, 6.372948889))
            Line((-41.195835744, 6.372948889), (-41.734651111, 6.911764256))
            Line((-41.734651111, 6.911764256), (-41.187746227, 7.458669141))
            ThreePointArc((-41.187746227, 7.458669141), (-42.068818791, 8.739196306), (-42.612402774, 10.195408906))
            Line((-42.612402774, 10.195408906), (-43.374092784, 10.061102407))
            Line((-43.374092784, 10.061102407), (-43.506412695, 10.811525914))
            Line((-43.506412695, 10.811525914), (-42.744722686, 10.945832414))
            ThreePointArc((-42.744722686, 10.945832414), (-41.421425305, 15.604622476), (-37.1983, 17.975414212))
            Line((-37.1983, 17.975414212), (-37.1983, 18.737414212))
            Line((-37.1983, 18.737414212), (-35.6743, 18.737414212))
        make_face(mode=Mode.SUBTRACT)
    extrude(amount=-CUT_EXTRUDE3_DEPTH, mode=Mode.SUBTRACT)

    # Fillet1
    fillet1_edges = [part.edges().sort_by_distance(p)[0] for p in [
        (0, -126.238, 30.060313337),
        (54.825313337, -126.238, 0),
        (0, -126.238, -30.060313337),
        (-54.825313337, -126.238, 0),
        (-55.155806669, -63.119, -30.390806669),
        (-55.155806669, -63.119, 30.390806669),
        (55.155806669, -63.119, -30.390806669),
        (55.155806669, -63.119, 30.390806669),
    ]]
    fillet(fillet1_edges, radius=FILLET1_R)

    # Fillet2
    fillet2_edges = [part.edges().sort_by_distance(p)[0] for p in [
        (54.742365646, 0, -29.977365646),
        (55.4863, 0, 0),
        (54.742365646, 0, 29.977365646),
        (0, 0, 30.7213),
        (-54.742365646, 0, 29.977365646),
        (-55.4863, 0, 0),
        (-54.742365646, 0, -29.977365646),
        (0, 0, -30.7213),
        (-36.4363, 0, -24.7523),
        (-48.960767849, 0, -24.195767849),
        (-49.5173, 0, -11.6713),
        (-48.960767849, 0, 0.853167849),
        (-36.4363, 0, 1.4097),
        (-23.911832151, 0, 0.853167849),
        (-23.3553, 0, -11.6713),
        (-23.911832151, 0, -24.195767849),
    ]]
    fillet(fillet2_edges, radius=FILLET2_R)

    # Sketch2 → Extrude2 (cut)
    with BuildSketch(Plane(origin=(0, 0, 0), x_dir=(1, 0, 0), z_dir=(0, 1, 0))):
        with Locations((-44.3103, -13.7287)):
            Circle(SKETCH2_R)
        with Locations((-28.5623, -13.7287)):
            Circle(SKETCH2_R)
        with Locations((-41.7703, -24.2443)):
            Circle(SKETCH2_R)
        with Locations((-15.1003, 23.1013)):
            Circle(SKETCH2_R)
        with Locations((-15.1003, 17.3863)):
            Circle(SKETCH2_R)
        with Locations((-15.1003, 11.6713)):
            Circle(SKETCH2_R)
        with Locations((-15.1003, 0.2413)):
            Circle(SKETCH2_R)
        with Locations((-15.1003, 5.9563)):
            Circle(SKETCH2_R)
    extrude(amount=-EXTRUDE2_DEPTH, mode=Mode.SUBTRACT)


solid = part.part
